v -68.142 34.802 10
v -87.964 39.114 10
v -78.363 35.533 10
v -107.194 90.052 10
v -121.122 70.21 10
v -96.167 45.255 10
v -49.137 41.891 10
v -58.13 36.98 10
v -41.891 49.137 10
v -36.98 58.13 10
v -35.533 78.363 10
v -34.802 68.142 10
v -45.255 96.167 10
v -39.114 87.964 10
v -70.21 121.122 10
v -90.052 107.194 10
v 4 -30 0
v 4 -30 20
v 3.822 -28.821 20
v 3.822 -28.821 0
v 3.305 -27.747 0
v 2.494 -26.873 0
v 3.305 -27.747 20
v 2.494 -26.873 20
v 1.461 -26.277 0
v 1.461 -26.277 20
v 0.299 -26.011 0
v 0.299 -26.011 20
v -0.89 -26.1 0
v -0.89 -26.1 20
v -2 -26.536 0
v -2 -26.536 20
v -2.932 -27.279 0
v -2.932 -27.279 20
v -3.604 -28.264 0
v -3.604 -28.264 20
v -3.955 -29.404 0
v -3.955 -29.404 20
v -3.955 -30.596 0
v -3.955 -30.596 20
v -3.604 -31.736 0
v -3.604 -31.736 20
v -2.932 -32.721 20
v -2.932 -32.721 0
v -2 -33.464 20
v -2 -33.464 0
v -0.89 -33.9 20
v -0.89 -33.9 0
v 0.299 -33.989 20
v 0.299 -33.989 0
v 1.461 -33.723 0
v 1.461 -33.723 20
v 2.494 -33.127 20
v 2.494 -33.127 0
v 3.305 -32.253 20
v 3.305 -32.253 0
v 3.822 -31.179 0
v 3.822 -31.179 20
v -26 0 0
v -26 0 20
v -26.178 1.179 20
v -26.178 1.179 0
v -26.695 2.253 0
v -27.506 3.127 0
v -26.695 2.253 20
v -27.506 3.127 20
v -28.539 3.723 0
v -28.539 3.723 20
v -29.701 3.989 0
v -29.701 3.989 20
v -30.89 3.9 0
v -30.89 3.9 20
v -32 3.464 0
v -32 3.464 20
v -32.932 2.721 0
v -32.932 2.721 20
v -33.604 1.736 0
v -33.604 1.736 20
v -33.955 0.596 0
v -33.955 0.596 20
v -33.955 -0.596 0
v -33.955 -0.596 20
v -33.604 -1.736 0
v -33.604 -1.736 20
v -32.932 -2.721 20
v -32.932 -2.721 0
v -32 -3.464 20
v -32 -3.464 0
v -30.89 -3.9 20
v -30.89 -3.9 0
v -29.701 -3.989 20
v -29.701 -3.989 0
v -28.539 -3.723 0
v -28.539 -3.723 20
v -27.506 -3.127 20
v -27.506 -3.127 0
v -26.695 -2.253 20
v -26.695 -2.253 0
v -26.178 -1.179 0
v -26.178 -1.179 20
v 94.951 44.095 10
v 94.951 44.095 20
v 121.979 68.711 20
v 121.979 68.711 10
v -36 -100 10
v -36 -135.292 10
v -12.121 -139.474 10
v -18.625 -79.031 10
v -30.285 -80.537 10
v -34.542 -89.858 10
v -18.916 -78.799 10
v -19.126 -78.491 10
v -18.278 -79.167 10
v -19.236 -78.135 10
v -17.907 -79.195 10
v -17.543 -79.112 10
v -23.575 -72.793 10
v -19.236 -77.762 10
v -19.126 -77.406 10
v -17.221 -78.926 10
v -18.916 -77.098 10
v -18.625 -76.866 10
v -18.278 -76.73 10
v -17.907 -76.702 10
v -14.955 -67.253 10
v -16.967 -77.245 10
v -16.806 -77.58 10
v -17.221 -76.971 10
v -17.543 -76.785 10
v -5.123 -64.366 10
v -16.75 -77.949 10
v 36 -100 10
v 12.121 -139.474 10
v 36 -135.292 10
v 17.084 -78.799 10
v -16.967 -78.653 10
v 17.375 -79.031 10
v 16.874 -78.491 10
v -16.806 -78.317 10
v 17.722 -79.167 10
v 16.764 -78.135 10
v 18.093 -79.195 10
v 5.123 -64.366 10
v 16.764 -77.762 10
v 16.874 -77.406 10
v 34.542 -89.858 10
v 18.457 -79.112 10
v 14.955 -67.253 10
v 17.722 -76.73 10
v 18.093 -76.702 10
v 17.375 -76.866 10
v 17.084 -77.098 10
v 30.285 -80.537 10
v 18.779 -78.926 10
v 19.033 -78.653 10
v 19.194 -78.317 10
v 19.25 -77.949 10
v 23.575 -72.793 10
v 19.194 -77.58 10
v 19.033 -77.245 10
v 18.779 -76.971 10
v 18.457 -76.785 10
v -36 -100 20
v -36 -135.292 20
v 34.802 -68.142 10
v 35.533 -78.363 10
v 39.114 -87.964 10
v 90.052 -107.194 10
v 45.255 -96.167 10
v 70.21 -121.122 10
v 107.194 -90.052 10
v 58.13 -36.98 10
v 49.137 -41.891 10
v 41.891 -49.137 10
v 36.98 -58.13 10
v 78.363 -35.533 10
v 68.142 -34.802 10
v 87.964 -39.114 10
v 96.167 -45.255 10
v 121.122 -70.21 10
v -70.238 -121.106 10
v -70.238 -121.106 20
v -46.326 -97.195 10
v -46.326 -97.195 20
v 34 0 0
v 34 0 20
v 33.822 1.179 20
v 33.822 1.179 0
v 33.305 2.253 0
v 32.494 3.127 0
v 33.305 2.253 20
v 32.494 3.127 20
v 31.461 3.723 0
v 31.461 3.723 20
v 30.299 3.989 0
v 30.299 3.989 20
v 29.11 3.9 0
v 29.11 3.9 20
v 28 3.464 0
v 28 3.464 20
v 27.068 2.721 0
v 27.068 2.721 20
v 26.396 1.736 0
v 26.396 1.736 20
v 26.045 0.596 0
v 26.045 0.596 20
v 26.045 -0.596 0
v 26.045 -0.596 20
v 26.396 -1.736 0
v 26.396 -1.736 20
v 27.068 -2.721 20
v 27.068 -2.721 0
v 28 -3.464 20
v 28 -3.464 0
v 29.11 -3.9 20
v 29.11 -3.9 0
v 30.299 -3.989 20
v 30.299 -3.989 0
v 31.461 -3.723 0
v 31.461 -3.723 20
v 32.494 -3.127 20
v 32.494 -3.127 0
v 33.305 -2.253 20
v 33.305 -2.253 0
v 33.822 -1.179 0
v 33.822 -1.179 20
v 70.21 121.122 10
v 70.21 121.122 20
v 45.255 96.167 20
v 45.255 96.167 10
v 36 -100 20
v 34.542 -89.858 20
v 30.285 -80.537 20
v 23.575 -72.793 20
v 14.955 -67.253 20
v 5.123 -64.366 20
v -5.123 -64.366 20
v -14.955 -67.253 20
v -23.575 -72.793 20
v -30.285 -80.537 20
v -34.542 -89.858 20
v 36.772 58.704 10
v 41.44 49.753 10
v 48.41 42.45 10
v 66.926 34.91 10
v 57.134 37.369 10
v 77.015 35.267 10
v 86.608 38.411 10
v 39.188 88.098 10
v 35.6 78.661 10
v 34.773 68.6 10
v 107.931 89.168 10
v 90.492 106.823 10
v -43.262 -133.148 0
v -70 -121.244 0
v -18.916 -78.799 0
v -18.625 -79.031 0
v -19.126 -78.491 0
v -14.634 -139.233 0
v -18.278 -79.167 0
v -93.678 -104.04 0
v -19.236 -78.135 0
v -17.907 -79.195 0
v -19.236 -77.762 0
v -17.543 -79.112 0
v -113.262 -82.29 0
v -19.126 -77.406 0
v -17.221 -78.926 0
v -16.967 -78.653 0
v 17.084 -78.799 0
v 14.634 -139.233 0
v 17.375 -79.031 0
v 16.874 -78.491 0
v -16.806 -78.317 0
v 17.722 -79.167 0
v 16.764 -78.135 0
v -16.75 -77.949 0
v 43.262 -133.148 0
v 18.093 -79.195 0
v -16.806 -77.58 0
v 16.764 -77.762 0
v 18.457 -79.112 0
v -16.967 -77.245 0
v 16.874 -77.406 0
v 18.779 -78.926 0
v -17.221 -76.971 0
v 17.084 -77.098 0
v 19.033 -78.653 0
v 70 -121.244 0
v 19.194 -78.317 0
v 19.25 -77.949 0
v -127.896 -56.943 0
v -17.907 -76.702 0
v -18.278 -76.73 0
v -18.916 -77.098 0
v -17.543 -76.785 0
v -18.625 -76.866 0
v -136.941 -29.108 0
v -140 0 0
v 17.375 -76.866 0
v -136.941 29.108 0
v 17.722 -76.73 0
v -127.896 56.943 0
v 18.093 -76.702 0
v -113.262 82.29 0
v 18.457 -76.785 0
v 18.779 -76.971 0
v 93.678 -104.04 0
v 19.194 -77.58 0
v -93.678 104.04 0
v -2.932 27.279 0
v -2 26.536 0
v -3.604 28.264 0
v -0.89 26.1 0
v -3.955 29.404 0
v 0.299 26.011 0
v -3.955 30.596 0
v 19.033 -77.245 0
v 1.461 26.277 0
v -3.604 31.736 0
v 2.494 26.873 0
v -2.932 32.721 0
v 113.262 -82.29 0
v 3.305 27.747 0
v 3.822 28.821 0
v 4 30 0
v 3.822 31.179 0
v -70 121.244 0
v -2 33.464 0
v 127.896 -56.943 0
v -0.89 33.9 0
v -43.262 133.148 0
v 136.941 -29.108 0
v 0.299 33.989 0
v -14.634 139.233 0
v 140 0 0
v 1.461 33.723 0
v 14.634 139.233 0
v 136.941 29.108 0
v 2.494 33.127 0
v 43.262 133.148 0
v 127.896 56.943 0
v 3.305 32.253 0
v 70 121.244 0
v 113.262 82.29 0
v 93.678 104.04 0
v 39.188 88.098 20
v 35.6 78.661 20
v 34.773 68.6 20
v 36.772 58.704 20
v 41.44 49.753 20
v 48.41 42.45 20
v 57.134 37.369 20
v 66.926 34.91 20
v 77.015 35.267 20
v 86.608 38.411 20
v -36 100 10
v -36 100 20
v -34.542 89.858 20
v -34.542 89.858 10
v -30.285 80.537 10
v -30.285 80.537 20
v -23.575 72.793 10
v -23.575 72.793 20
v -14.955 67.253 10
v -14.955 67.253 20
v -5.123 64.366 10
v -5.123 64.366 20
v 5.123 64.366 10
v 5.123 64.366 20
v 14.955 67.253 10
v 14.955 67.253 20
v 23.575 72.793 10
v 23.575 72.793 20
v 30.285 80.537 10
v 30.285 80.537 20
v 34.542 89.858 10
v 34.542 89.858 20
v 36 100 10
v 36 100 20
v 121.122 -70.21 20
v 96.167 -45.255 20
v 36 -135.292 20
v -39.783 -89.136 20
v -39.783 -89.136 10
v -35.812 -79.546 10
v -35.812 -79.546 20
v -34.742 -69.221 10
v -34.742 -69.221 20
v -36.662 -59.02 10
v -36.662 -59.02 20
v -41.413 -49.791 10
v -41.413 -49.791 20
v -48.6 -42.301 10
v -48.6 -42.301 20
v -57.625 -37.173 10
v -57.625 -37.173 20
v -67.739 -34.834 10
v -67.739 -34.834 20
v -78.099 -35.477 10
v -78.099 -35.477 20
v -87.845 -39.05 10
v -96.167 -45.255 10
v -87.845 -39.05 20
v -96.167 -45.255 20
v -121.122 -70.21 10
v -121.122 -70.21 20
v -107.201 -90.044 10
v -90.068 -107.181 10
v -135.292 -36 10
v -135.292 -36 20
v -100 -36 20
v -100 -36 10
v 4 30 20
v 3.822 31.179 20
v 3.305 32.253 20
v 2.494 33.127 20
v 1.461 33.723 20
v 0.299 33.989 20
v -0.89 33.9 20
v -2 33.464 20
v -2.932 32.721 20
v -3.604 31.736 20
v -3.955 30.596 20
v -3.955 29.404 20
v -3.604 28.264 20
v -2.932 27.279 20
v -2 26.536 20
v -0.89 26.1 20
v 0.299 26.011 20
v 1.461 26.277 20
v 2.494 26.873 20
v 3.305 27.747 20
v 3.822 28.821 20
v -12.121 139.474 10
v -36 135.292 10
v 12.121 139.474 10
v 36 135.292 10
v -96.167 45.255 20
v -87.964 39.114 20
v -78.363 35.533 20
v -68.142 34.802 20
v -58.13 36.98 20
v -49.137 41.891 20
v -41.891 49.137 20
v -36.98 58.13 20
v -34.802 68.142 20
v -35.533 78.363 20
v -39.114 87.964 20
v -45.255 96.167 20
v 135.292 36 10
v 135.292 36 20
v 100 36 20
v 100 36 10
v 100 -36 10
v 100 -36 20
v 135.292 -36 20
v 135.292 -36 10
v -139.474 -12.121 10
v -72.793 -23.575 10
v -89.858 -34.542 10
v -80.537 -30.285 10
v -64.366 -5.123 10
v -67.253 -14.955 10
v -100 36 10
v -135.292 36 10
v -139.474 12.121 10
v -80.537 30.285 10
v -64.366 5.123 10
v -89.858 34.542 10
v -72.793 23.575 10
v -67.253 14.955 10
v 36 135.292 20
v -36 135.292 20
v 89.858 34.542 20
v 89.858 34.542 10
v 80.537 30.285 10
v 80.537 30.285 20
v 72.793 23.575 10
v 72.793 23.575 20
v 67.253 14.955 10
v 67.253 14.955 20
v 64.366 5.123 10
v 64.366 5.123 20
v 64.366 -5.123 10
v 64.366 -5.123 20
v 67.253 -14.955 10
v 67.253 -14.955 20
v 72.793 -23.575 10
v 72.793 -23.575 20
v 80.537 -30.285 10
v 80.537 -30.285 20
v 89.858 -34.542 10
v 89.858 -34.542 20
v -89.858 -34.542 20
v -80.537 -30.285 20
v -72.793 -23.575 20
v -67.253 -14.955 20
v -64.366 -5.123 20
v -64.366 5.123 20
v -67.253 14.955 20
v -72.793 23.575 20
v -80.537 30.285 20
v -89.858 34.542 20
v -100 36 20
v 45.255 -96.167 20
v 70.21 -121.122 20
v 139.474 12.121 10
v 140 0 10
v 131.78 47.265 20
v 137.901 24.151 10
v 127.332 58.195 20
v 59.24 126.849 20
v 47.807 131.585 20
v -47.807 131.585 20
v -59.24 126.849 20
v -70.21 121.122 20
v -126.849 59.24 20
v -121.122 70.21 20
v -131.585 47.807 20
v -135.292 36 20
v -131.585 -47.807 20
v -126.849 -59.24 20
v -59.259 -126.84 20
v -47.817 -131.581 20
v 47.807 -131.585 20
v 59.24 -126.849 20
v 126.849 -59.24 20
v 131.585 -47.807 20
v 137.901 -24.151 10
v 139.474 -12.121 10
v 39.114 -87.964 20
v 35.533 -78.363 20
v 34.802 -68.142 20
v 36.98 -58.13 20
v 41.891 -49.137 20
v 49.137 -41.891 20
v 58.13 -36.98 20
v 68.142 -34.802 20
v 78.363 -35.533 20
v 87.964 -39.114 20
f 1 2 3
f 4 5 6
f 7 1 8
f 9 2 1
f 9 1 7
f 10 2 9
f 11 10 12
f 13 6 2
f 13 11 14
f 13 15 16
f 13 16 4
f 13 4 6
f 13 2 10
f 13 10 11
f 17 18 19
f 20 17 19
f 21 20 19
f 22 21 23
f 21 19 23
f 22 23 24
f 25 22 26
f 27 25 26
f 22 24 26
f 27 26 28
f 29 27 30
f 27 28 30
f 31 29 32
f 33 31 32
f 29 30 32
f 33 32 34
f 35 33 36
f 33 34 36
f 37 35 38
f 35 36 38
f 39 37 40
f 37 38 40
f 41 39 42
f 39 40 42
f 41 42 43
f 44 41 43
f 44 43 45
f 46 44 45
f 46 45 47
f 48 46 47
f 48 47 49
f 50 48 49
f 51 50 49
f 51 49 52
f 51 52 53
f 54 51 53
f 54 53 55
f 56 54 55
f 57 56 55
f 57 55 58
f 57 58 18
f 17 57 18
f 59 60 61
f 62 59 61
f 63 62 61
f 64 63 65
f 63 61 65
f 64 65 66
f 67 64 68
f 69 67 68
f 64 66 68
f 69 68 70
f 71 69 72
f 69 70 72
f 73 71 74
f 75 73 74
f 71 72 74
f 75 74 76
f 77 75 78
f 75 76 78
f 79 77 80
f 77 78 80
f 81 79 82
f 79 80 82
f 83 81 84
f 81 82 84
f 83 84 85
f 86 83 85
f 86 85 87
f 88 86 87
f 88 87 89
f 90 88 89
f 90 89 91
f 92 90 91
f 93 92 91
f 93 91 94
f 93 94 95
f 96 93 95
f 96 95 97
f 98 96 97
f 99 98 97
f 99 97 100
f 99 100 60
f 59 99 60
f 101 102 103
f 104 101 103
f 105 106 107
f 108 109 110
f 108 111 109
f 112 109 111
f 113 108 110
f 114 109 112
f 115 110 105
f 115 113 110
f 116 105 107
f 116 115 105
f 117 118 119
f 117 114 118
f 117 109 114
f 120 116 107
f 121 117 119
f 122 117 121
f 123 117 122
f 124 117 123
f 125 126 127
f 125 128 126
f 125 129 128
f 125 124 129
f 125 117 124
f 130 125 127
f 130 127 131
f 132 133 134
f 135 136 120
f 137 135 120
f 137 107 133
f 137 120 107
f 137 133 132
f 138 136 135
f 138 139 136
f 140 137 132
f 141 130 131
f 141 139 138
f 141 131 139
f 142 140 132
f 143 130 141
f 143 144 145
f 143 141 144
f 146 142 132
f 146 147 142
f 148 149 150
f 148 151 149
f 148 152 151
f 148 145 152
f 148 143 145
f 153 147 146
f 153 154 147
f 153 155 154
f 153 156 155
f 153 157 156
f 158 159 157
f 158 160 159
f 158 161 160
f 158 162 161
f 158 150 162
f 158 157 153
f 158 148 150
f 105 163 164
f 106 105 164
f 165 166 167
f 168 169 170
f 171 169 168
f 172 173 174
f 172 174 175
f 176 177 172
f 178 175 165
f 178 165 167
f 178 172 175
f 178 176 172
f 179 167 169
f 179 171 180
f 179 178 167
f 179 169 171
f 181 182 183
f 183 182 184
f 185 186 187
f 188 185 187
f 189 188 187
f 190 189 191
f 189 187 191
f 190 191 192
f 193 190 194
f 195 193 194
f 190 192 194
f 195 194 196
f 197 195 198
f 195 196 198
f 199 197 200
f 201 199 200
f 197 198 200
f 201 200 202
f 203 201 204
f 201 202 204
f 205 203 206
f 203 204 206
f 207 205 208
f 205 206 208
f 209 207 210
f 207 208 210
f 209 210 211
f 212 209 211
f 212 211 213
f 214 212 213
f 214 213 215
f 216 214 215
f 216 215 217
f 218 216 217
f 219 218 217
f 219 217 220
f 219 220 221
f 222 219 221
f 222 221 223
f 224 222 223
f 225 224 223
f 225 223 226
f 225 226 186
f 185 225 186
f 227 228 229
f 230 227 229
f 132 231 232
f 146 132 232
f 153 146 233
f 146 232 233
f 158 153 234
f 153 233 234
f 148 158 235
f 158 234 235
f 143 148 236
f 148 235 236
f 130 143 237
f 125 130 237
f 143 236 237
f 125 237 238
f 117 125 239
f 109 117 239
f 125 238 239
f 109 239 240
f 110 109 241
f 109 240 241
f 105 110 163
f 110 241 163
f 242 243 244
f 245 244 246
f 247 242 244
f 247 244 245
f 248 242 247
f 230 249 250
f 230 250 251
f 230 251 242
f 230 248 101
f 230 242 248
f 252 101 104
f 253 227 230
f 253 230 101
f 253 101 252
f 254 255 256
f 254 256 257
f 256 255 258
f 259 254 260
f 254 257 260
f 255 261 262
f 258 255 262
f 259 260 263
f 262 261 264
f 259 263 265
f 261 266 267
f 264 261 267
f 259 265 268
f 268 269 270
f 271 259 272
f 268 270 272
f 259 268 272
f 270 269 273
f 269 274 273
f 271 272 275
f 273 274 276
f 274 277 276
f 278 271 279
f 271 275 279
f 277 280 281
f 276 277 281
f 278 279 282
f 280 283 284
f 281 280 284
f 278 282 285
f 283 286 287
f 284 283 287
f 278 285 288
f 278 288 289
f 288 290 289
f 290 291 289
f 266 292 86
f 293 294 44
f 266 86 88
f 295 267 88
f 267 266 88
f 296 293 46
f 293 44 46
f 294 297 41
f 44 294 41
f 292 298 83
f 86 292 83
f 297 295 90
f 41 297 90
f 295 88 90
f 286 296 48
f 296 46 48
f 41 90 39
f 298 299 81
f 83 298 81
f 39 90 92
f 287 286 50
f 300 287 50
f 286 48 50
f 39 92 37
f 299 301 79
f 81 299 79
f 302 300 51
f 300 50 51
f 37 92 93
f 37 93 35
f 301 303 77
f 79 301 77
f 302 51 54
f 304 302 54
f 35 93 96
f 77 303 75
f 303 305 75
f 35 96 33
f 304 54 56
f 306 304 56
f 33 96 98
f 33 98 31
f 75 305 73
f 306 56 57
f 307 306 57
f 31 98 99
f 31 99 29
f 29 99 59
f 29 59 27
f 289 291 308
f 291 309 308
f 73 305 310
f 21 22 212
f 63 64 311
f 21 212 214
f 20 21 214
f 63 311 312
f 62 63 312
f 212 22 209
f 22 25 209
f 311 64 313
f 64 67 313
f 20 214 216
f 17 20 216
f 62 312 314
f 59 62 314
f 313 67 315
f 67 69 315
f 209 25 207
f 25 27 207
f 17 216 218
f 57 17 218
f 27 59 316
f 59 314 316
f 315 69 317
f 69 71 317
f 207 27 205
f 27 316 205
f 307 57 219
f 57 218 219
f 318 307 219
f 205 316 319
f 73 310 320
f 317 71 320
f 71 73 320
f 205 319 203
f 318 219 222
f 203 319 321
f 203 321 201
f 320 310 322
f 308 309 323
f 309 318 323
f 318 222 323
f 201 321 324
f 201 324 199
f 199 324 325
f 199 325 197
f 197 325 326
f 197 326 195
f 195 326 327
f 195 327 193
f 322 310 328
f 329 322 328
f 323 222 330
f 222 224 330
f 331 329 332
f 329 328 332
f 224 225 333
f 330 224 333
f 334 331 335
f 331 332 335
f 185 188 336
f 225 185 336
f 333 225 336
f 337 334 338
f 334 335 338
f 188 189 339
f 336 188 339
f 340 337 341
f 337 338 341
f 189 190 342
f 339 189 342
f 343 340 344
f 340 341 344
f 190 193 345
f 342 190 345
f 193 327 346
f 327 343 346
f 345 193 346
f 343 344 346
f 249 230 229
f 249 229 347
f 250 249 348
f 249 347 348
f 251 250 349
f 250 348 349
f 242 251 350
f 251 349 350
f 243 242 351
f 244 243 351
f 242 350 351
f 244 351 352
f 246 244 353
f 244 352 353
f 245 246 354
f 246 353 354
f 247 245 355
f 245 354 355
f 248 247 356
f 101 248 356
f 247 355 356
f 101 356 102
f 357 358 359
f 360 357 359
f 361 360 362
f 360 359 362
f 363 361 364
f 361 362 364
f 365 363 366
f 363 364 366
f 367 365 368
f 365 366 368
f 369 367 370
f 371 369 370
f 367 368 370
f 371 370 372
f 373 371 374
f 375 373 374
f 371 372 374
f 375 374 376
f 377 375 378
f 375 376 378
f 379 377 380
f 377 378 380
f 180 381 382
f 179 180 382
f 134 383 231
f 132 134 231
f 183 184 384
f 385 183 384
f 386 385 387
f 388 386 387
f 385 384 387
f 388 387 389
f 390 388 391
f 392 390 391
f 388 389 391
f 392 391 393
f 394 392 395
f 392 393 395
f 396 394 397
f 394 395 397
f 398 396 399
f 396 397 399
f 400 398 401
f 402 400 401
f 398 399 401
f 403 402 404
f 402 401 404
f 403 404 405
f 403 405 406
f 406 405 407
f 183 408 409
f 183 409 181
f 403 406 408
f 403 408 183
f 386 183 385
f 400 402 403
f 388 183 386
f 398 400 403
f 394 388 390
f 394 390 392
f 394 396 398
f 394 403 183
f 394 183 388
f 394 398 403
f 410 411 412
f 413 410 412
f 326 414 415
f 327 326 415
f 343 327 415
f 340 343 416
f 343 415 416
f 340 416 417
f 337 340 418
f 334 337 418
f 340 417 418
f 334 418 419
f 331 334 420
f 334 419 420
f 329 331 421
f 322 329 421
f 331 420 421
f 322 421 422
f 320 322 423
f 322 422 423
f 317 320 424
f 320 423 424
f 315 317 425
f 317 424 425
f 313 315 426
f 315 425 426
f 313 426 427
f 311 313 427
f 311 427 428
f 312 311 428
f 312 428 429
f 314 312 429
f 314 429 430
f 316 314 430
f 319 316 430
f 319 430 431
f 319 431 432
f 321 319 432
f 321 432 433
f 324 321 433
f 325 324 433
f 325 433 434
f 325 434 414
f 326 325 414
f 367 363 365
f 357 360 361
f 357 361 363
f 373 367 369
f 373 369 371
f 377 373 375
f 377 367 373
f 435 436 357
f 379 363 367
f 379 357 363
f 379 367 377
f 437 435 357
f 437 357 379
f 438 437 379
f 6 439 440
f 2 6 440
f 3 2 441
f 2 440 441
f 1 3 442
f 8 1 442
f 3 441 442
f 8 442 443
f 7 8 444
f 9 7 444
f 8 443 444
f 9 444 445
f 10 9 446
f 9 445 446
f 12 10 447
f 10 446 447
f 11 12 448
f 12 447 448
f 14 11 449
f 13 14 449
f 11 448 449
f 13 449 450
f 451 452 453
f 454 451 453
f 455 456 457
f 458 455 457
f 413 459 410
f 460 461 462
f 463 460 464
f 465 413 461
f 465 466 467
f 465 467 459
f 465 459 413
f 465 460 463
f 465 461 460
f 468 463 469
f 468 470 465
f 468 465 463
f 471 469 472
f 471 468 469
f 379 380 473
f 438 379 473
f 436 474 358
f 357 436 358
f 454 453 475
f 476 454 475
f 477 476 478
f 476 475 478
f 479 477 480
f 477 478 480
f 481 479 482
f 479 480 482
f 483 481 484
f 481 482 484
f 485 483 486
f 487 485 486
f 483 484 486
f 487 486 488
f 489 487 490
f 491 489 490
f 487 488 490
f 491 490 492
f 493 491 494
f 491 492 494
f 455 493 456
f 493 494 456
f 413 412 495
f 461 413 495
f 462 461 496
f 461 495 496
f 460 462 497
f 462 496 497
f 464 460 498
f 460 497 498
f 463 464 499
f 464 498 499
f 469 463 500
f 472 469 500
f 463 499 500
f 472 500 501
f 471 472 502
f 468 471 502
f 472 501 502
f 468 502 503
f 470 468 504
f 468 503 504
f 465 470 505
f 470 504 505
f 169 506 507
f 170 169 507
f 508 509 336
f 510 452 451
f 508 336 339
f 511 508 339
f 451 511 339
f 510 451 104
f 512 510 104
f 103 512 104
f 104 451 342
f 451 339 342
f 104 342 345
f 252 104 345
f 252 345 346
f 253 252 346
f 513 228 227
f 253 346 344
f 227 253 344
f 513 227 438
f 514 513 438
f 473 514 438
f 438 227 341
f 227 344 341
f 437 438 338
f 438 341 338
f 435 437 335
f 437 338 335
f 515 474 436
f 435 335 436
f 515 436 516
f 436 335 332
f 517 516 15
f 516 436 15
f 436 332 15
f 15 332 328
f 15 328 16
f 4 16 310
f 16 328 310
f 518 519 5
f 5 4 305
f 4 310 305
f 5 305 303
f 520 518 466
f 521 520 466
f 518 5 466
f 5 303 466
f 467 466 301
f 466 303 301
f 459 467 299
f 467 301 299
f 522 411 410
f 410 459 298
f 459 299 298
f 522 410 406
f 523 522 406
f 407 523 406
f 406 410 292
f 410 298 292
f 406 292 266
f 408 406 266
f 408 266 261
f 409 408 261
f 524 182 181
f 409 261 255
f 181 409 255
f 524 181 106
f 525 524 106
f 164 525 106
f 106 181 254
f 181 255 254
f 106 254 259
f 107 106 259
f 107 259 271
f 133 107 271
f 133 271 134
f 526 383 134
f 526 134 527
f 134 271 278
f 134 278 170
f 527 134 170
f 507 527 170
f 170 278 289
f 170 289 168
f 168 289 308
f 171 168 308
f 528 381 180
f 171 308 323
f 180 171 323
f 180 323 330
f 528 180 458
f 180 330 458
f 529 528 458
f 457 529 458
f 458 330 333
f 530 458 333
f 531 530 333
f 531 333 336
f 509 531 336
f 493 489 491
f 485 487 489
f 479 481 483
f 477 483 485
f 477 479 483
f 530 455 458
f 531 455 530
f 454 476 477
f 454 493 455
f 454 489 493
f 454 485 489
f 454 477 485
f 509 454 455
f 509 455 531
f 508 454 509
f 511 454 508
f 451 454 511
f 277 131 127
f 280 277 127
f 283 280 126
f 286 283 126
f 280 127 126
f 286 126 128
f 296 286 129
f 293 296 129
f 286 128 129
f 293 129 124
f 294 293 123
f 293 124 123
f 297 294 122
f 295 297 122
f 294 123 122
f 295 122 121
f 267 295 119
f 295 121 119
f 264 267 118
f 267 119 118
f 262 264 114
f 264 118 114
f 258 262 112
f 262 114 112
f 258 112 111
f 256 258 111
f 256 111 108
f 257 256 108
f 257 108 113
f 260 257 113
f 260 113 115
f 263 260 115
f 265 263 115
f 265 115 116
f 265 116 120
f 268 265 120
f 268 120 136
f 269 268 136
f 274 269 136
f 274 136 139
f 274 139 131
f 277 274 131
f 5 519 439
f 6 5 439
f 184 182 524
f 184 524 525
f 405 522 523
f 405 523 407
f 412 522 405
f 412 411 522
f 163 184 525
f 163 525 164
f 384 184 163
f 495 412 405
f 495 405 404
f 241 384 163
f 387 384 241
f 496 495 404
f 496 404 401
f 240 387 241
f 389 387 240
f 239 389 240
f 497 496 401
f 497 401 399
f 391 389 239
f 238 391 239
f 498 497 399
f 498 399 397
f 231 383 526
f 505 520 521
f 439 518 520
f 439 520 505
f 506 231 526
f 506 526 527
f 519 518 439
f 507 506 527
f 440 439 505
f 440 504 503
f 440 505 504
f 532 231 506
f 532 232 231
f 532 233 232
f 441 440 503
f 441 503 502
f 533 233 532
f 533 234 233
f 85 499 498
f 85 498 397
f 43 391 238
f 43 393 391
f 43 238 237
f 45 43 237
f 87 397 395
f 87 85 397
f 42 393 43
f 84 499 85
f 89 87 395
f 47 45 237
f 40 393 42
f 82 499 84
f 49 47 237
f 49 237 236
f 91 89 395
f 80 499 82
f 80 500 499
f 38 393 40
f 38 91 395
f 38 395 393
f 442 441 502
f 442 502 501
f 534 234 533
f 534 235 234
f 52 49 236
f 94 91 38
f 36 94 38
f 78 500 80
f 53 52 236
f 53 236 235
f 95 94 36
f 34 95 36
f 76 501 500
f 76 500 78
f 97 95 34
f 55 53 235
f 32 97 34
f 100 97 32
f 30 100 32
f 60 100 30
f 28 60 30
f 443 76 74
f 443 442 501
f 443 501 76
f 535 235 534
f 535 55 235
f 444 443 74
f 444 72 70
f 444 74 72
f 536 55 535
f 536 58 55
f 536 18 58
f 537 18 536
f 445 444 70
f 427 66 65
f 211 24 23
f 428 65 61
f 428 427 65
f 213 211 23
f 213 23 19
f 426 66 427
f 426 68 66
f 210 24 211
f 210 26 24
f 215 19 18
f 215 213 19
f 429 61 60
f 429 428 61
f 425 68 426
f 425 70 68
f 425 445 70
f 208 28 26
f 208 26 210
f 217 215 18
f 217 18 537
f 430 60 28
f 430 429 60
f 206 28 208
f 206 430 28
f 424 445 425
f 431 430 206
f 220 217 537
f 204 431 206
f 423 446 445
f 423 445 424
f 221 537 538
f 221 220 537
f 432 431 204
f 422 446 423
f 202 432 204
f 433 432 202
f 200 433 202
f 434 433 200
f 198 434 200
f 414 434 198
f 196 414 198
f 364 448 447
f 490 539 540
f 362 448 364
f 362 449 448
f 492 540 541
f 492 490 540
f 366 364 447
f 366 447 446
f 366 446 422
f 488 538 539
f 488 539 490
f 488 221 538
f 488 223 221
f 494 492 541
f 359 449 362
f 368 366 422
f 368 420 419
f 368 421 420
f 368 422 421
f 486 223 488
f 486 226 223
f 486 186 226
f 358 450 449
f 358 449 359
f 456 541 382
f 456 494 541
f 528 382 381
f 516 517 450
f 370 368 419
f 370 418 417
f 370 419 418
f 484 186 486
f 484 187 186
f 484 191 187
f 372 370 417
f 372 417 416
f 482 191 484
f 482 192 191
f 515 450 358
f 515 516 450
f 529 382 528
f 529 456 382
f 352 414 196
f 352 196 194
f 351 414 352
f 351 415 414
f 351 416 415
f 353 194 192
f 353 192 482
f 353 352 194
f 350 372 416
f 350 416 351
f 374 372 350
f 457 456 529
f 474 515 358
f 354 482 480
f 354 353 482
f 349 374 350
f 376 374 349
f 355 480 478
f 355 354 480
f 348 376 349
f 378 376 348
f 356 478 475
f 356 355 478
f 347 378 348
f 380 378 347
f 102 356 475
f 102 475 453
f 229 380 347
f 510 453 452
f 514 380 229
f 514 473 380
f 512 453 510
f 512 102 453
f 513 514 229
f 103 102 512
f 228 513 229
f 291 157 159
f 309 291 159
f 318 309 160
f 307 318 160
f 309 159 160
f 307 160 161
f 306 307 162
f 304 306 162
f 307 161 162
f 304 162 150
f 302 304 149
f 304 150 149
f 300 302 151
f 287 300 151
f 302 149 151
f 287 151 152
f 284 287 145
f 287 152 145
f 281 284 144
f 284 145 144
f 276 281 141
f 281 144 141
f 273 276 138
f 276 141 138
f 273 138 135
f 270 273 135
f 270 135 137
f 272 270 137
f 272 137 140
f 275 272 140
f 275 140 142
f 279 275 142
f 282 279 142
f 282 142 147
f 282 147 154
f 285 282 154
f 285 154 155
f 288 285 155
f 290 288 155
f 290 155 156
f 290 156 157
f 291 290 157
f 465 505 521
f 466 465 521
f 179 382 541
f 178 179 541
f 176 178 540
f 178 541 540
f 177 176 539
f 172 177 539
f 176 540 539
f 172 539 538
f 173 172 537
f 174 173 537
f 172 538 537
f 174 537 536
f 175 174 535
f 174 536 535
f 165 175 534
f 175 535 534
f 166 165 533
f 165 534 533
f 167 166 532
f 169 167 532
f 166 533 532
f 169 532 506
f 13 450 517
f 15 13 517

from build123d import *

# Parameters (mm, degrees)
F0_R     = 140
F1_DEPTH = 20
F3_DEPTH = 10
F4_R     = 1.25
F5_DEPTH = 10.001
F6_R     = 4
F7_DEPTH = 20.001


with BuildPart() as f1:
    # F0 (on Top) → F1 (new body)
    with BuildSketch(Plane.XY):
        Circle(F0_R)
    extrude(amount=F1_DEPTH)

    # F2 (on face) → F3 (cut)
    with BuildSketch(Plane.XY.offset(20)):
        with BuildLine():
            Line((-36, 135.2922762023), (-36, 100))
            ThreePointArc((-36, 100), (0, 64), (36, 100))
            Line((36, 100), (36, 135.2922762023))
            ThreePointArc((36, 135.2922762023), (0, 140), (-36, 135.2922762023))
        make_face()
        with BuildLine():
            Line((70.2102418221, 121.1219300675), (45.2548339959, 96.1665222414))
            ThreePointArc((45.2548339959, 96.1665222414), (44.6678642757, 45.8556615799), (94.9513362933, 44.0950719587))
            Line((94.9513362933, 44.0950719587), (121.9787816378, 68.7108203281))
            ThreePointArc((121.9787816378, 68.7108203281), (99.6036459707, 98.382486802), (70.2102418221, 121.1219300675))
        make_face()
        with BuildLine():
            Line((-70.2376639838, -121.1060302301), (-46.3264134966, -97.1947797428))
            ThreePointArc((-46.3264134966, -97.1947797428), (-44.7351788606, -45.7853207833), (-96.1665222414, -45.2548339959))
            Line((-96.1665222414, -45.2548339959), (-121.1219300675, -70.2102418221))
            ThreePointArc((-121.1219300675, -70.2102418221), (-99.0061557596, -98.9837417039), (-70.2376639838, -121.1060302301))
        make_face()
        with BuildLine():
            Line((135.2922762023, 36), (100, 36))
            ThreePointArc((100, 36), (64, 0), (100, -36))
            Line((100, -36), (135.2922762023, -36))
            ThreePointArc((135.2922762023, -36), (140, 0), (135.2922762023, 36))
        make_face()
        with BuildLine():
            Line((-135.2922762023, -36), (-100, -36))
            ThreePointArc((-100, -36), (-64, 0), (-100, 36))
            Line((-100, 36), (-135.2922762023, 36))
            ThreePointArc((-135.2922762023, 36), (-140, 0), (-135.2922762023, -36))
        make_face()
        with BuildLine():
            Line((36, -135.2922762023), (36, -100))
            ThreePointArc((36, -100), (0, -64), (-36, -100))
            Line((-36, -100), (-36, -135.2922762023))
            ThreePointArc((-36, -135.2922762023), (0, -140), (36, -135.2922762023))
        make_face()
        with BuildLine():
            Line((121.1219300675, -70.2102418221), (96.1665222414, -45.2548339959))
            ThreePointArc((96.1665222414, -45.2548339959), (45.2548339959, -45.2548339959), (45.2548339959, -96.1665222414))
            Line((45.2548339959, -96.1665222414), (70.2102418221, -121.1219300675))
            ThreePointArc((70.2102418221, -121.1219300675), (98.9949493661, -98.9949493661), (121.1219300675, -70.2102418221))
        make_face()
        with BuildLine():
            Line((-121.1219300675, 70.2102418221), (-96.1665222414, 45.2548339959))
            ThreePointArc((-96.1665222414, 45.2548339959), (-45.2548339959, 45.2548339959), (-45.2548339959, 96.1665222414))
            Line((-45.2548339959, 96.1665222414), (-70.2102418221, 121.1219300675))
            ThreePointArc((-70.2102418221, 121.1219300675), (-98.9949493661, 98.9949493661), (-121.1219300675, 70.2102418221))
        make_face()
    extrude(amount=-F3_DEPTH, mode=Mode.SUBTRACT)

    # F4 (on face) → F5 (cut, through all)
    with BuildSketch(Plane.XY.offset(10)):
        with Locations((-18, -77.9487010796)):
            Circle(F4_R)
        with Locations((18, -77.9487010796)):
            Circle(F4_R)
    extrude(amount=-F5_DEPTH, mode=Mode.SUBTRACT)

    # F6 (on face) → F7 (cut, through all)
    with BuildSketch(Plane.XY.offset(20)):
        with Locations((30, 0)):
            Circle(F6_R)
        with Locations((0, -30)):
            Circle(F6_R)
        with Locations((-30, 0)):
            Circle(F6_R)
        with Locations((0, 30)):
            Circle(F6_R)
    extrude(amount=-F7_DEPTH, mode=Mode.SUBTRACT)


solid = f1.part
